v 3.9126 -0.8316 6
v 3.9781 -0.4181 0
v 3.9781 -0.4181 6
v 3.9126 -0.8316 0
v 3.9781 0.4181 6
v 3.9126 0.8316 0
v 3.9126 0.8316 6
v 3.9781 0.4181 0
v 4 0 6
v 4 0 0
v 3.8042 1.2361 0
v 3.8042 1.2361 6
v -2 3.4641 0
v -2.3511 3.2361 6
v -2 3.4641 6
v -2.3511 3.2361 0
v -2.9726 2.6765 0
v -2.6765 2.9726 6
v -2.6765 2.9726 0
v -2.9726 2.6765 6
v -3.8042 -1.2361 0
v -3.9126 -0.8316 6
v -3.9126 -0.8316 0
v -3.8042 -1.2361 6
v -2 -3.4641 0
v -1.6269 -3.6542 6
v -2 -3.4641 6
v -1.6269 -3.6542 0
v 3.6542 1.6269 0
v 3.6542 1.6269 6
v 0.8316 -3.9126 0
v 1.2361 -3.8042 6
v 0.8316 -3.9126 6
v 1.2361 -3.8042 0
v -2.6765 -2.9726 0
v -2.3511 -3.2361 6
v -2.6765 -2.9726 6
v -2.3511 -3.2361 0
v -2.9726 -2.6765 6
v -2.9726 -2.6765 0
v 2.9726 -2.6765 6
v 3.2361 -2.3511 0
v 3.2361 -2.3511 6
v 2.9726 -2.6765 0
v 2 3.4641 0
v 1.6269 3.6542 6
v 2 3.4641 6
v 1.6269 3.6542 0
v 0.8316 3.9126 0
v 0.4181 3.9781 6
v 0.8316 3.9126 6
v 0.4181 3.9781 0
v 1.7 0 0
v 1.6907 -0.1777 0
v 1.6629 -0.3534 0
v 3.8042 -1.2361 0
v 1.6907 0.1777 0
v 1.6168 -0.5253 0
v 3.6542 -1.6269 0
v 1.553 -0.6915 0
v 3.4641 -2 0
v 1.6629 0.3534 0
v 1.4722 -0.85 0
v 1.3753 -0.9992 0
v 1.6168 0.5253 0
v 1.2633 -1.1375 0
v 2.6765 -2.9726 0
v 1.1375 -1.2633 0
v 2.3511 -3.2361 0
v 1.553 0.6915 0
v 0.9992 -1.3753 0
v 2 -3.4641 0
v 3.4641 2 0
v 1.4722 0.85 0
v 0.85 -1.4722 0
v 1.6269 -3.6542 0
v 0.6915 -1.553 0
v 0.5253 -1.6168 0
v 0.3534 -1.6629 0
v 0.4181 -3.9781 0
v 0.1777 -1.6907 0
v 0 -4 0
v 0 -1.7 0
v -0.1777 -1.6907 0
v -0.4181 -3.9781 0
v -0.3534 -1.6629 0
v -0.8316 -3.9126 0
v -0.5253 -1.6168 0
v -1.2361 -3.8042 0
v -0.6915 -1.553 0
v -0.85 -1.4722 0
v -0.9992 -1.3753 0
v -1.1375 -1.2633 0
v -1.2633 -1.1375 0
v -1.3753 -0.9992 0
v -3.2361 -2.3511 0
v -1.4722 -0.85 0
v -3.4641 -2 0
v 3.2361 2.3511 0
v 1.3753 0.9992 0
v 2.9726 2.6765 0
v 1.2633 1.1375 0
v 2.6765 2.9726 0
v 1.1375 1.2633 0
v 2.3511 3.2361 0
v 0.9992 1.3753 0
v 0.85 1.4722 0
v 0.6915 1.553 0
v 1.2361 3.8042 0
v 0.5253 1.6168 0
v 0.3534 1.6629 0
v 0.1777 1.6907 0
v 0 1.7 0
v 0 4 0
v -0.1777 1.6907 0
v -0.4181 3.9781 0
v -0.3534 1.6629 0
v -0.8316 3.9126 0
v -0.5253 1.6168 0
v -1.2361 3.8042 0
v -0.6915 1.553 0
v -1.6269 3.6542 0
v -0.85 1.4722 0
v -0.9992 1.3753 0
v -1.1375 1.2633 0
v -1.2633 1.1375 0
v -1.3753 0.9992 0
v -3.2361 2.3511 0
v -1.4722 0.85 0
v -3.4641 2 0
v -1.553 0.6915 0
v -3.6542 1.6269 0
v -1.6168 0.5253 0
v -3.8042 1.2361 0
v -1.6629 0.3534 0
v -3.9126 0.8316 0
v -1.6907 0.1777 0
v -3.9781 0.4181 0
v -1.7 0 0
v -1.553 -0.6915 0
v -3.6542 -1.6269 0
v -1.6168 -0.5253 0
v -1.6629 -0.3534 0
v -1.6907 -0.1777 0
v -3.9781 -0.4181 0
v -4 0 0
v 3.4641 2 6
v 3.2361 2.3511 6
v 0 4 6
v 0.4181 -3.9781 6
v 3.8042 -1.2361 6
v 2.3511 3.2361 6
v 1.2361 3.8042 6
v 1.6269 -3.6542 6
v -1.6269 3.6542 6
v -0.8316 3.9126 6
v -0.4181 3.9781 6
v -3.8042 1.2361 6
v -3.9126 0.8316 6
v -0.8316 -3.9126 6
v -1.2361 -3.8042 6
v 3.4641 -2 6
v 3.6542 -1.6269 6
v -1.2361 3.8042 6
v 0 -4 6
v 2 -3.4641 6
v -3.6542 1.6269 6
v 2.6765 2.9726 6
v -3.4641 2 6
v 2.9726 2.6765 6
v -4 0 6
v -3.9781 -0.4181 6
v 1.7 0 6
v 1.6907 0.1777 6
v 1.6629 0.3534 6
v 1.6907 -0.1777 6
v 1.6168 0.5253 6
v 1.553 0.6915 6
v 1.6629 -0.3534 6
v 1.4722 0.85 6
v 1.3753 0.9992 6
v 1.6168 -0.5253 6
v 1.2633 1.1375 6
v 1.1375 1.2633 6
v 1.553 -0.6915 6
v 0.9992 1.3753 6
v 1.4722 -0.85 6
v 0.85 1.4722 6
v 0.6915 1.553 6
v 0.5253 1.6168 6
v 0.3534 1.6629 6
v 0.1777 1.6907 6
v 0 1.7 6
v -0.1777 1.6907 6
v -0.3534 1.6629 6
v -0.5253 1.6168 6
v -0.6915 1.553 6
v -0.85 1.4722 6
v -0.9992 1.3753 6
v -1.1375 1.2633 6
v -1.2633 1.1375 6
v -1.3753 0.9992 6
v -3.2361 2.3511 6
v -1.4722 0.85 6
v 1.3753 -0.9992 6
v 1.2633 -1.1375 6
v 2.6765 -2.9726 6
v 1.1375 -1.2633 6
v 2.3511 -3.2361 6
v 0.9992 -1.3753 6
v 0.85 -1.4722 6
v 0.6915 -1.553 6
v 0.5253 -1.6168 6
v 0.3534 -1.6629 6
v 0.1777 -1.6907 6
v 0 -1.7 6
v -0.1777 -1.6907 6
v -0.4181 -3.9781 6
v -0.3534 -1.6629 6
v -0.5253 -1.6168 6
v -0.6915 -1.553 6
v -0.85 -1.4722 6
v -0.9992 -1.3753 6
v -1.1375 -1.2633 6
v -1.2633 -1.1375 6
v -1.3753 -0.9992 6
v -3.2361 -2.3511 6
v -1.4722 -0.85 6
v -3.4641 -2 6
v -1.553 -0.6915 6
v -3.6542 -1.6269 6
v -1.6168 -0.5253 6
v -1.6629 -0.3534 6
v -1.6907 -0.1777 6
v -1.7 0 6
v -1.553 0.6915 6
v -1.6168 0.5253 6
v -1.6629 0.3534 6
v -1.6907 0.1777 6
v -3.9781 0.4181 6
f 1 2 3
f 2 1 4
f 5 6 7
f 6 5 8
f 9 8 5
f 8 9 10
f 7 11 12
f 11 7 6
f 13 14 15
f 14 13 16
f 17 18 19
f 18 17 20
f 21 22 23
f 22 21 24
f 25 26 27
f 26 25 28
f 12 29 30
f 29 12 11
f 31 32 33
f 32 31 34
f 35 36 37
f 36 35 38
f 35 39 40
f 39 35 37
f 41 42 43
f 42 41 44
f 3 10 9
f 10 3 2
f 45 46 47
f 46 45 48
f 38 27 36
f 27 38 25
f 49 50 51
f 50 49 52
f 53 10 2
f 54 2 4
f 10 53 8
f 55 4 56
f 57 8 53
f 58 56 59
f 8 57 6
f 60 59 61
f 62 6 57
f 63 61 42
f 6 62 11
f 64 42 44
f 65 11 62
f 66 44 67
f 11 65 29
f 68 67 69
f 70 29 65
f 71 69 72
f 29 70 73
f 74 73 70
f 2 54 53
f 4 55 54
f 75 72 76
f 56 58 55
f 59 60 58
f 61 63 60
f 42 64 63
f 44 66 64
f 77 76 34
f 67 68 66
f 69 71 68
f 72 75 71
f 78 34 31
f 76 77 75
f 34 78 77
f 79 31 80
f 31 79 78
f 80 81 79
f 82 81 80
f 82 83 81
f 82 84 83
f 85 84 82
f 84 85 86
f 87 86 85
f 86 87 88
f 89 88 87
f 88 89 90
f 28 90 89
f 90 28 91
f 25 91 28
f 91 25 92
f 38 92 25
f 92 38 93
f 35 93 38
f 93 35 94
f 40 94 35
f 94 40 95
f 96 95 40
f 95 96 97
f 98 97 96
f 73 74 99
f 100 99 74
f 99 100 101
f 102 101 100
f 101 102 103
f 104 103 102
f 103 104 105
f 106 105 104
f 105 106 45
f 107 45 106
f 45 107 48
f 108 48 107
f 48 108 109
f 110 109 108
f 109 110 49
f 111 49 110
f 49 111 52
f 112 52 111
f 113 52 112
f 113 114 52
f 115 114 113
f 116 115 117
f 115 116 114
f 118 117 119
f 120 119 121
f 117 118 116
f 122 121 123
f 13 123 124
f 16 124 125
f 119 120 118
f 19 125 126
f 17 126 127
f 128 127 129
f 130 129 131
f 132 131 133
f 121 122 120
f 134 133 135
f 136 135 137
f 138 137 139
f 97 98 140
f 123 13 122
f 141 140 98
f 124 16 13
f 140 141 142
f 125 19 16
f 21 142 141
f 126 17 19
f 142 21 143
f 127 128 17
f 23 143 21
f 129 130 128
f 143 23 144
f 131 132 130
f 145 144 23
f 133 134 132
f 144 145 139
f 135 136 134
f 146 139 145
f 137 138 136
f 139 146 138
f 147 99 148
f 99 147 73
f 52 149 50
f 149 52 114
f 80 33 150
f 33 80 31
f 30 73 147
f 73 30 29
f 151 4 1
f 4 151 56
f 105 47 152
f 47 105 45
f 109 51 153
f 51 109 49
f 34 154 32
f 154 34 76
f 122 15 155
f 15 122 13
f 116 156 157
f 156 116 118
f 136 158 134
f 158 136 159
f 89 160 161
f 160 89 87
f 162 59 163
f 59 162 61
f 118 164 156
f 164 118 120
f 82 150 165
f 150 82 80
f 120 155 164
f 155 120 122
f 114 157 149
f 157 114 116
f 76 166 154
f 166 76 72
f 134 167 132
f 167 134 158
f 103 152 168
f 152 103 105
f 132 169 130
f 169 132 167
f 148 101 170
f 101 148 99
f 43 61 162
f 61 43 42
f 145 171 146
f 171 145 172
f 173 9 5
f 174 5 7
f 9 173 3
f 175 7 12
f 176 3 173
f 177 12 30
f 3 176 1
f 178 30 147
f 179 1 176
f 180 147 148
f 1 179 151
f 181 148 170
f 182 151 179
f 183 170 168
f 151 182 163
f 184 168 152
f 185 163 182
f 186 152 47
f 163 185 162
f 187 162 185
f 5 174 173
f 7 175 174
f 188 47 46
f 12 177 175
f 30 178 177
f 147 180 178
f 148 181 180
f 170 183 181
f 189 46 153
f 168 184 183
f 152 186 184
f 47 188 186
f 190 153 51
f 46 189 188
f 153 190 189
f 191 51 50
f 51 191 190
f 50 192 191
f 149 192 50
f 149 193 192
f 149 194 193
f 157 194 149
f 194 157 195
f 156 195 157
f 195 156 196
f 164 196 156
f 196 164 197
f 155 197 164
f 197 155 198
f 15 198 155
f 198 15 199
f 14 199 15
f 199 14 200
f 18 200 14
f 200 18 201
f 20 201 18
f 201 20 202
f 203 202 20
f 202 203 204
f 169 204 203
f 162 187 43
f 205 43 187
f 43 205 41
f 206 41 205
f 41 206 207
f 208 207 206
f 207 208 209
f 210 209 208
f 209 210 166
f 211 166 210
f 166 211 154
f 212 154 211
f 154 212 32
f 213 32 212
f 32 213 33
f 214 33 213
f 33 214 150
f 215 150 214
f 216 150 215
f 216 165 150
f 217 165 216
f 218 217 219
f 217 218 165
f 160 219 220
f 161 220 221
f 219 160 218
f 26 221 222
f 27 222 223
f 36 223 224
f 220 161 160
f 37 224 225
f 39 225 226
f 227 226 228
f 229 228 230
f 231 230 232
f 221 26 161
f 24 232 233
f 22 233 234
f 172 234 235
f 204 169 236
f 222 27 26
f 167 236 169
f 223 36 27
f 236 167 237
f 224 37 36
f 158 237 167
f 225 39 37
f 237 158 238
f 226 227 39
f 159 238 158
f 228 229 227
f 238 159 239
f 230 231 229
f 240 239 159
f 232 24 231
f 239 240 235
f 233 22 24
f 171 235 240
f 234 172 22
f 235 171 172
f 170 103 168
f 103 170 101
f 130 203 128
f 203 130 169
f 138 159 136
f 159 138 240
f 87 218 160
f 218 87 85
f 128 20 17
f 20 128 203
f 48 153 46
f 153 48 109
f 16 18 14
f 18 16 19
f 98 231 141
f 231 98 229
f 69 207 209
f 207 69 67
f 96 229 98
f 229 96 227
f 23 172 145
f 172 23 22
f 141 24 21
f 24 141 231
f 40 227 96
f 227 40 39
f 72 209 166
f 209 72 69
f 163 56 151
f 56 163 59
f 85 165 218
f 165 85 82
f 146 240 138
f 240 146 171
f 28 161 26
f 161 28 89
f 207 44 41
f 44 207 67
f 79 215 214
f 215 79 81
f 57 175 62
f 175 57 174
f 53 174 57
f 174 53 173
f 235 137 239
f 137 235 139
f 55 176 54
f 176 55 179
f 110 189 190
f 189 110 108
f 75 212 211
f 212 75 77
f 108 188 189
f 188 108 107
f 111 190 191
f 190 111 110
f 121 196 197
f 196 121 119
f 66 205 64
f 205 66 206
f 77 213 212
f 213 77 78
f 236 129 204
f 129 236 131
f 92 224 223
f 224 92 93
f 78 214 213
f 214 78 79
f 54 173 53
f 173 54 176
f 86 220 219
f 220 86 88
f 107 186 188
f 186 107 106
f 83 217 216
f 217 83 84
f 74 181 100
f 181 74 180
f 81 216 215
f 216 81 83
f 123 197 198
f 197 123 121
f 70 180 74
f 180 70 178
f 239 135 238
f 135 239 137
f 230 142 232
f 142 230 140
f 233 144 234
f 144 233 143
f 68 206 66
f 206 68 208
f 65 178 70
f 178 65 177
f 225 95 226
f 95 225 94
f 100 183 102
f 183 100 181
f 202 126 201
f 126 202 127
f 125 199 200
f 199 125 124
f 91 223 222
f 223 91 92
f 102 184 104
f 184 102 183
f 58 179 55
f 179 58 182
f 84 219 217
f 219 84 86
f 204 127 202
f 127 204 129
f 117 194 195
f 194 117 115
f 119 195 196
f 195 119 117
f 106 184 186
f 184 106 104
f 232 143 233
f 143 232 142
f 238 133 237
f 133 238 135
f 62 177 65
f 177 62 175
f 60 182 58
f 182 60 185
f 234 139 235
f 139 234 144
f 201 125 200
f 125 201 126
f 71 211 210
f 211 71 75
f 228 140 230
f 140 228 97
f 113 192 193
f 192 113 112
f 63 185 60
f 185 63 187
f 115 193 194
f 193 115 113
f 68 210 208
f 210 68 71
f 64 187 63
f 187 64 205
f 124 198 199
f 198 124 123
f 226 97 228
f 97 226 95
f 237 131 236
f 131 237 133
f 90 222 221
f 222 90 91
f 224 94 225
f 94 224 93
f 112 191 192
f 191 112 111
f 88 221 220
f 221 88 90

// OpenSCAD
// Round spacer.
$fn = 60;
eps = 0.02;
inner_d = 3.4;
outer_d = 8;
length = 6;
difference() { cylinder(d=outer_d,h=length); translate([0,0,-eps]) cylinder(d=inner_d,h=length+2*eps); }
